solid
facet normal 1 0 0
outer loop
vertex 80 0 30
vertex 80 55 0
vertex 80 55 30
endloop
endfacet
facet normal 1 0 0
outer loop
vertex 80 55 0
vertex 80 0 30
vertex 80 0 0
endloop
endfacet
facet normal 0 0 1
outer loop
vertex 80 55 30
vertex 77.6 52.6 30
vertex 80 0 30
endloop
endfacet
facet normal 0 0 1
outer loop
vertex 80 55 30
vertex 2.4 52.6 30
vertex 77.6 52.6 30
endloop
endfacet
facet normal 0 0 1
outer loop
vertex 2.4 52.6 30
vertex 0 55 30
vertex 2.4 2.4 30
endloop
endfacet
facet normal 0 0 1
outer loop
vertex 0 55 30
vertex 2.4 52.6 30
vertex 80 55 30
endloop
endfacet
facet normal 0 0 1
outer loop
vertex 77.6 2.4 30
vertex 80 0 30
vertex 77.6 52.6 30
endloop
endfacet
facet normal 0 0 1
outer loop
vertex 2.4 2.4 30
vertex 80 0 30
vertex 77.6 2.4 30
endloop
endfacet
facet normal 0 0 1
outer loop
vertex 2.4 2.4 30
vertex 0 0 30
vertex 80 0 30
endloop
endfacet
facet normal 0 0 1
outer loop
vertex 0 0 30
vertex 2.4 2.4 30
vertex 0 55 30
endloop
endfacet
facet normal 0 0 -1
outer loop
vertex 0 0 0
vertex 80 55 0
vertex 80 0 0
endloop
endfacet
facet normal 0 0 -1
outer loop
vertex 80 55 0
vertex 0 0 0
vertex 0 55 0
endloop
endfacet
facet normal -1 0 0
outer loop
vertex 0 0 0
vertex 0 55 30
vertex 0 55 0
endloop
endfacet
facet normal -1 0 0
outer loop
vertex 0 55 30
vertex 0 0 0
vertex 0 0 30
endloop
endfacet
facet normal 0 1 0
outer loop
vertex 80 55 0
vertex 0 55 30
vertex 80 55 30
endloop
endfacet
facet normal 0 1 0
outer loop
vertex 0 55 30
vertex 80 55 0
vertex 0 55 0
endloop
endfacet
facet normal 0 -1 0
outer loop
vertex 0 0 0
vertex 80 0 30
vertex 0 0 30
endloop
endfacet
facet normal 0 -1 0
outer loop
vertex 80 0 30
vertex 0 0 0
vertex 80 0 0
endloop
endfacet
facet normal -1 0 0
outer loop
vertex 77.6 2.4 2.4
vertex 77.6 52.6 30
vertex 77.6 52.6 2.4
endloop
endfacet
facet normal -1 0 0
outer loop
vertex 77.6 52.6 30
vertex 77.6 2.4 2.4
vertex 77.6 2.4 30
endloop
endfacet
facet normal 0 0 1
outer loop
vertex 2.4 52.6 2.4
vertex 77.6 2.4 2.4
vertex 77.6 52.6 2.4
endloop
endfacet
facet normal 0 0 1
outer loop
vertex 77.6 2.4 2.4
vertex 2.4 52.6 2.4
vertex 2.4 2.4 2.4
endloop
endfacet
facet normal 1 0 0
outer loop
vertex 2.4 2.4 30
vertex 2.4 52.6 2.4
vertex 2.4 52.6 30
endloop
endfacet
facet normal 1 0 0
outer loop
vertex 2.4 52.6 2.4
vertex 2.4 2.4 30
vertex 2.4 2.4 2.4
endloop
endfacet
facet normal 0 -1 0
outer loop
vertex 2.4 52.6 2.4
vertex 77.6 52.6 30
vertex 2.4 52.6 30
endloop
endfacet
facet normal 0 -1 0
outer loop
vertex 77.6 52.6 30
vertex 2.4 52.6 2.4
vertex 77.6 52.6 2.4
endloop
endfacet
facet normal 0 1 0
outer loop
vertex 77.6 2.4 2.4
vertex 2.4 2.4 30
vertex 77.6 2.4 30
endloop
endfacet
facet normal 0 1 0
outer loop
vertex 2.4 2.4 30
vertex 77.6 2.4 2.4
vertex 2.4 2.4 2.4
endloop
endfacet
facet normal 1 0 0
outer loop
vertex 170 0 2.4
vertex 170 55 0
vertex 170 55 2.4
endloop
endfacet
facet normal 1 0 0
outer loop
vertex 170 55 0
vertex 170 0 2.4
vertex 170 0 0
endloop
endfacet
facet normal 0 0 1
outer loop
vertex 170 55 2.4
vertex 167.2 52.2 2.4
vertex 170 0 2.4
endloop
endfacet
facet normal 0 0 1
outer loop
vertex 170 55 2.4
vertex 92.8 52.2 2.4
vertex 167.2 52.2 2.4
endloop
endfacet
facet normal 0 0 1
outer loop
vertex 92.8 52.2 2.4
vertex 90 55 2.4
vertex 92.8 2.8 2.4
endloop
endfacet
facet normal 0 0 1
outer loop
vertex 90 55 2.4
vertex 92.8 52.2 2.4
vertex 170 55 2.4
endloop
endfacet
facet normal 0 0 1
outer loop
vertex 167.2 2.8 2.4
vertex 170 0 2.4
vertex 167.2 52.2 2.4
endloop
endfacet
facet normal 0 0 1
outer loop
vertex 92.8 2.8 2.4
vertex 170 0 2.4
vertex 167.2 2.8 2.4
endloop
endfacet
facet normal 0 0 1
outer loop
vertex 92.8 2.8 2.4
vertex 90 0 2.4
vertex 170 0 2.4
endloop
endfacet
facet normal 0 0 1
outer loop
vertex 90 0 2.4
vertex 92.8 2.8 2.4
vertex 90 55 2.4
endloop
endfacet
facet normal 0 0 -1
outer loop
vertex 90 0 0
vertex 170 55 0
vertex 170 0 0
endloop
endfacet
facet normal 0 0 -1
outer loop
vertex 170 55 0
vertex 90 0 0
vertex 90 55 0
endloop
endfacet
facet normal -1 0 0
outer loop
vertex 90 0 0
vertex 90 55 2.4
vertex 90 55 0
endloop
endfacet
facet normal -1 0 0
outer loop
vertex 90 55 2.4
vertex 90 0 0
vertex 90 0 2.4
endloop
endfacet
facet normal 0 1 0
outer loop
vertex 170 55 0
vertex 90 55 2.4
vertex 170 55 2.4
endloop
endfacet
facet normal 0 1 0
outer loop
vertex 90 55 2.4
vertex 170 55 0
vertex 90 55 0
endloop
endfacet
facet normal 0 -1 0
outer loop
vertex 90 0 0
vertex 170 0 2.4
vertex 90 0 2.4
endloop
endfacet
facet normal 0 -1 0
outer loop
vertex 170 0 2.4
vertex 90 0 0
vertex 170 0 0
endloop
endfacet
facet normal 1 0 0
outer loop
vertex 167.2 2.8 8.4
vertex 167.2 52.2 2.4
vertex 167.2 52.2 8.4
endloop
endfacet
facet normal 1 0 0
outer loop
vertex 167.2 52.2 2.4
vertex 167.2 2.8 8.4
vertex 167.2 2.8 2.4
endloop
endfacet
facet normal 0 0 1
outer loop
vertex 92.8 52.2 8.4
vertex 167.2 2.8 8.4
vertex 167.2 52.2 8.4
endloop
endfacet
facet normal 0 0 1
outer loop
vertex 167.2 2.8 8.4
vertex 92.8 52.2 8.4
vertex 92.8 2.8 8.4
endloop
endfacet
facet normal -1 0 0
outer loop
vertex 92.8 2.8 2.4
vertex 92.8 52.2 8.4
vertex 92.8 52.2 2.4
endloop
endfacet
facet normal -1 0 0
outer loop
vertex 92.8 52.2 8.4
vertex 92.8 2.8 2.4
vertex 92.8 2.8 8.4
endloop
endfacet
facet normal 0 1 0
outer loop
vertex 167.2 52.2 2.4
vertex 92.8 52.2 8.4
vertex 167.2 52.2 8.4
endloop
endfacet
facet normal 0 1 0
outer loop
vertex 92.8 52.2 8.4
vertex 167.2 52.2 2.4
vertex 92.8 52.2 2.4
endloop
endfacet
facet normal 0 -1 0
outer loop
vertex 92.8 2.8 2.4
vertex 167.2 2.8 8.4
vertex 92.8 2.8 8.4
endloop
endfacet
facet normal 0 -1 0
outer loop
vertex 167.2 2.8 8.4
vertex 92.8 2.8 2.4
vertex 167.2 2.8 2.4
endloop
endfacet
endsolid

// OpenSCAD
// project-box.scad — a two-part project box with a lid.
// Every dimension is a variable, and the ones marked with
// the Customizer comments below can be changed from the
// OpenSCAD Customizer panel — or from the command line
// with -D, which chapter 8 does for real.

/* [Box dimensions] */
// Outside width of the box (x)
width = 80;          // [40:200]
// Outside depth of the box (y)
depth = 55;          // [30:150]
// Outside height of the box, without the lid (z)
height = 30;         // [15:100]
// Wall thickness everywhere
wall = 2.4;          // [1.2:0.4:5]
// How tall the lid's lip... rim is
lid_height = 6;      // [3:15]

/* [Hidden] */
$fn = 48;

// The shell: a solid block minus a smaller block that
// starts one wall up from the floor and pokes out of the
// top, leaving walls and a floor of thickness `wall`.
module shell(w, d, h, t) {
    difference() {
        cube([w, d, h]);
        translate([t, t, t])
            cube([w - 2 * t, d - 2 * t, h]);
    }
}

// The box itself.
shell(width, depth, height, wall);

// The lid, printed separately: a flat slab the size of
// the box, with a rim that drops INTO the shell's mouth.
// The rim is one clearance smaller than the inside, so
// the lid fits instead of wedging.
//
// Echoed so a command-line run reports the fit numbers
// (chapter 5 introduces echo).
inside_w = width - 2 * wall;
inside_d = depth - 2 * wall;
clearance = 0.4;
echo(str("inside opening: ", inside_w, " x ", inside_d));
echo(str("rim size: ", inside_w - 2 * clearance,
         " x ", inside_d - 2 * clearance));

translate([width + 10, 0, 0]) {
    cube([width, depth, 2.4]);
    translate([wall + clearance, wall + clearance, 2.4])
        cube([inside_w - 2 * clearance,
              inside_d - 2 * clearance,
              lid_height]);
}
